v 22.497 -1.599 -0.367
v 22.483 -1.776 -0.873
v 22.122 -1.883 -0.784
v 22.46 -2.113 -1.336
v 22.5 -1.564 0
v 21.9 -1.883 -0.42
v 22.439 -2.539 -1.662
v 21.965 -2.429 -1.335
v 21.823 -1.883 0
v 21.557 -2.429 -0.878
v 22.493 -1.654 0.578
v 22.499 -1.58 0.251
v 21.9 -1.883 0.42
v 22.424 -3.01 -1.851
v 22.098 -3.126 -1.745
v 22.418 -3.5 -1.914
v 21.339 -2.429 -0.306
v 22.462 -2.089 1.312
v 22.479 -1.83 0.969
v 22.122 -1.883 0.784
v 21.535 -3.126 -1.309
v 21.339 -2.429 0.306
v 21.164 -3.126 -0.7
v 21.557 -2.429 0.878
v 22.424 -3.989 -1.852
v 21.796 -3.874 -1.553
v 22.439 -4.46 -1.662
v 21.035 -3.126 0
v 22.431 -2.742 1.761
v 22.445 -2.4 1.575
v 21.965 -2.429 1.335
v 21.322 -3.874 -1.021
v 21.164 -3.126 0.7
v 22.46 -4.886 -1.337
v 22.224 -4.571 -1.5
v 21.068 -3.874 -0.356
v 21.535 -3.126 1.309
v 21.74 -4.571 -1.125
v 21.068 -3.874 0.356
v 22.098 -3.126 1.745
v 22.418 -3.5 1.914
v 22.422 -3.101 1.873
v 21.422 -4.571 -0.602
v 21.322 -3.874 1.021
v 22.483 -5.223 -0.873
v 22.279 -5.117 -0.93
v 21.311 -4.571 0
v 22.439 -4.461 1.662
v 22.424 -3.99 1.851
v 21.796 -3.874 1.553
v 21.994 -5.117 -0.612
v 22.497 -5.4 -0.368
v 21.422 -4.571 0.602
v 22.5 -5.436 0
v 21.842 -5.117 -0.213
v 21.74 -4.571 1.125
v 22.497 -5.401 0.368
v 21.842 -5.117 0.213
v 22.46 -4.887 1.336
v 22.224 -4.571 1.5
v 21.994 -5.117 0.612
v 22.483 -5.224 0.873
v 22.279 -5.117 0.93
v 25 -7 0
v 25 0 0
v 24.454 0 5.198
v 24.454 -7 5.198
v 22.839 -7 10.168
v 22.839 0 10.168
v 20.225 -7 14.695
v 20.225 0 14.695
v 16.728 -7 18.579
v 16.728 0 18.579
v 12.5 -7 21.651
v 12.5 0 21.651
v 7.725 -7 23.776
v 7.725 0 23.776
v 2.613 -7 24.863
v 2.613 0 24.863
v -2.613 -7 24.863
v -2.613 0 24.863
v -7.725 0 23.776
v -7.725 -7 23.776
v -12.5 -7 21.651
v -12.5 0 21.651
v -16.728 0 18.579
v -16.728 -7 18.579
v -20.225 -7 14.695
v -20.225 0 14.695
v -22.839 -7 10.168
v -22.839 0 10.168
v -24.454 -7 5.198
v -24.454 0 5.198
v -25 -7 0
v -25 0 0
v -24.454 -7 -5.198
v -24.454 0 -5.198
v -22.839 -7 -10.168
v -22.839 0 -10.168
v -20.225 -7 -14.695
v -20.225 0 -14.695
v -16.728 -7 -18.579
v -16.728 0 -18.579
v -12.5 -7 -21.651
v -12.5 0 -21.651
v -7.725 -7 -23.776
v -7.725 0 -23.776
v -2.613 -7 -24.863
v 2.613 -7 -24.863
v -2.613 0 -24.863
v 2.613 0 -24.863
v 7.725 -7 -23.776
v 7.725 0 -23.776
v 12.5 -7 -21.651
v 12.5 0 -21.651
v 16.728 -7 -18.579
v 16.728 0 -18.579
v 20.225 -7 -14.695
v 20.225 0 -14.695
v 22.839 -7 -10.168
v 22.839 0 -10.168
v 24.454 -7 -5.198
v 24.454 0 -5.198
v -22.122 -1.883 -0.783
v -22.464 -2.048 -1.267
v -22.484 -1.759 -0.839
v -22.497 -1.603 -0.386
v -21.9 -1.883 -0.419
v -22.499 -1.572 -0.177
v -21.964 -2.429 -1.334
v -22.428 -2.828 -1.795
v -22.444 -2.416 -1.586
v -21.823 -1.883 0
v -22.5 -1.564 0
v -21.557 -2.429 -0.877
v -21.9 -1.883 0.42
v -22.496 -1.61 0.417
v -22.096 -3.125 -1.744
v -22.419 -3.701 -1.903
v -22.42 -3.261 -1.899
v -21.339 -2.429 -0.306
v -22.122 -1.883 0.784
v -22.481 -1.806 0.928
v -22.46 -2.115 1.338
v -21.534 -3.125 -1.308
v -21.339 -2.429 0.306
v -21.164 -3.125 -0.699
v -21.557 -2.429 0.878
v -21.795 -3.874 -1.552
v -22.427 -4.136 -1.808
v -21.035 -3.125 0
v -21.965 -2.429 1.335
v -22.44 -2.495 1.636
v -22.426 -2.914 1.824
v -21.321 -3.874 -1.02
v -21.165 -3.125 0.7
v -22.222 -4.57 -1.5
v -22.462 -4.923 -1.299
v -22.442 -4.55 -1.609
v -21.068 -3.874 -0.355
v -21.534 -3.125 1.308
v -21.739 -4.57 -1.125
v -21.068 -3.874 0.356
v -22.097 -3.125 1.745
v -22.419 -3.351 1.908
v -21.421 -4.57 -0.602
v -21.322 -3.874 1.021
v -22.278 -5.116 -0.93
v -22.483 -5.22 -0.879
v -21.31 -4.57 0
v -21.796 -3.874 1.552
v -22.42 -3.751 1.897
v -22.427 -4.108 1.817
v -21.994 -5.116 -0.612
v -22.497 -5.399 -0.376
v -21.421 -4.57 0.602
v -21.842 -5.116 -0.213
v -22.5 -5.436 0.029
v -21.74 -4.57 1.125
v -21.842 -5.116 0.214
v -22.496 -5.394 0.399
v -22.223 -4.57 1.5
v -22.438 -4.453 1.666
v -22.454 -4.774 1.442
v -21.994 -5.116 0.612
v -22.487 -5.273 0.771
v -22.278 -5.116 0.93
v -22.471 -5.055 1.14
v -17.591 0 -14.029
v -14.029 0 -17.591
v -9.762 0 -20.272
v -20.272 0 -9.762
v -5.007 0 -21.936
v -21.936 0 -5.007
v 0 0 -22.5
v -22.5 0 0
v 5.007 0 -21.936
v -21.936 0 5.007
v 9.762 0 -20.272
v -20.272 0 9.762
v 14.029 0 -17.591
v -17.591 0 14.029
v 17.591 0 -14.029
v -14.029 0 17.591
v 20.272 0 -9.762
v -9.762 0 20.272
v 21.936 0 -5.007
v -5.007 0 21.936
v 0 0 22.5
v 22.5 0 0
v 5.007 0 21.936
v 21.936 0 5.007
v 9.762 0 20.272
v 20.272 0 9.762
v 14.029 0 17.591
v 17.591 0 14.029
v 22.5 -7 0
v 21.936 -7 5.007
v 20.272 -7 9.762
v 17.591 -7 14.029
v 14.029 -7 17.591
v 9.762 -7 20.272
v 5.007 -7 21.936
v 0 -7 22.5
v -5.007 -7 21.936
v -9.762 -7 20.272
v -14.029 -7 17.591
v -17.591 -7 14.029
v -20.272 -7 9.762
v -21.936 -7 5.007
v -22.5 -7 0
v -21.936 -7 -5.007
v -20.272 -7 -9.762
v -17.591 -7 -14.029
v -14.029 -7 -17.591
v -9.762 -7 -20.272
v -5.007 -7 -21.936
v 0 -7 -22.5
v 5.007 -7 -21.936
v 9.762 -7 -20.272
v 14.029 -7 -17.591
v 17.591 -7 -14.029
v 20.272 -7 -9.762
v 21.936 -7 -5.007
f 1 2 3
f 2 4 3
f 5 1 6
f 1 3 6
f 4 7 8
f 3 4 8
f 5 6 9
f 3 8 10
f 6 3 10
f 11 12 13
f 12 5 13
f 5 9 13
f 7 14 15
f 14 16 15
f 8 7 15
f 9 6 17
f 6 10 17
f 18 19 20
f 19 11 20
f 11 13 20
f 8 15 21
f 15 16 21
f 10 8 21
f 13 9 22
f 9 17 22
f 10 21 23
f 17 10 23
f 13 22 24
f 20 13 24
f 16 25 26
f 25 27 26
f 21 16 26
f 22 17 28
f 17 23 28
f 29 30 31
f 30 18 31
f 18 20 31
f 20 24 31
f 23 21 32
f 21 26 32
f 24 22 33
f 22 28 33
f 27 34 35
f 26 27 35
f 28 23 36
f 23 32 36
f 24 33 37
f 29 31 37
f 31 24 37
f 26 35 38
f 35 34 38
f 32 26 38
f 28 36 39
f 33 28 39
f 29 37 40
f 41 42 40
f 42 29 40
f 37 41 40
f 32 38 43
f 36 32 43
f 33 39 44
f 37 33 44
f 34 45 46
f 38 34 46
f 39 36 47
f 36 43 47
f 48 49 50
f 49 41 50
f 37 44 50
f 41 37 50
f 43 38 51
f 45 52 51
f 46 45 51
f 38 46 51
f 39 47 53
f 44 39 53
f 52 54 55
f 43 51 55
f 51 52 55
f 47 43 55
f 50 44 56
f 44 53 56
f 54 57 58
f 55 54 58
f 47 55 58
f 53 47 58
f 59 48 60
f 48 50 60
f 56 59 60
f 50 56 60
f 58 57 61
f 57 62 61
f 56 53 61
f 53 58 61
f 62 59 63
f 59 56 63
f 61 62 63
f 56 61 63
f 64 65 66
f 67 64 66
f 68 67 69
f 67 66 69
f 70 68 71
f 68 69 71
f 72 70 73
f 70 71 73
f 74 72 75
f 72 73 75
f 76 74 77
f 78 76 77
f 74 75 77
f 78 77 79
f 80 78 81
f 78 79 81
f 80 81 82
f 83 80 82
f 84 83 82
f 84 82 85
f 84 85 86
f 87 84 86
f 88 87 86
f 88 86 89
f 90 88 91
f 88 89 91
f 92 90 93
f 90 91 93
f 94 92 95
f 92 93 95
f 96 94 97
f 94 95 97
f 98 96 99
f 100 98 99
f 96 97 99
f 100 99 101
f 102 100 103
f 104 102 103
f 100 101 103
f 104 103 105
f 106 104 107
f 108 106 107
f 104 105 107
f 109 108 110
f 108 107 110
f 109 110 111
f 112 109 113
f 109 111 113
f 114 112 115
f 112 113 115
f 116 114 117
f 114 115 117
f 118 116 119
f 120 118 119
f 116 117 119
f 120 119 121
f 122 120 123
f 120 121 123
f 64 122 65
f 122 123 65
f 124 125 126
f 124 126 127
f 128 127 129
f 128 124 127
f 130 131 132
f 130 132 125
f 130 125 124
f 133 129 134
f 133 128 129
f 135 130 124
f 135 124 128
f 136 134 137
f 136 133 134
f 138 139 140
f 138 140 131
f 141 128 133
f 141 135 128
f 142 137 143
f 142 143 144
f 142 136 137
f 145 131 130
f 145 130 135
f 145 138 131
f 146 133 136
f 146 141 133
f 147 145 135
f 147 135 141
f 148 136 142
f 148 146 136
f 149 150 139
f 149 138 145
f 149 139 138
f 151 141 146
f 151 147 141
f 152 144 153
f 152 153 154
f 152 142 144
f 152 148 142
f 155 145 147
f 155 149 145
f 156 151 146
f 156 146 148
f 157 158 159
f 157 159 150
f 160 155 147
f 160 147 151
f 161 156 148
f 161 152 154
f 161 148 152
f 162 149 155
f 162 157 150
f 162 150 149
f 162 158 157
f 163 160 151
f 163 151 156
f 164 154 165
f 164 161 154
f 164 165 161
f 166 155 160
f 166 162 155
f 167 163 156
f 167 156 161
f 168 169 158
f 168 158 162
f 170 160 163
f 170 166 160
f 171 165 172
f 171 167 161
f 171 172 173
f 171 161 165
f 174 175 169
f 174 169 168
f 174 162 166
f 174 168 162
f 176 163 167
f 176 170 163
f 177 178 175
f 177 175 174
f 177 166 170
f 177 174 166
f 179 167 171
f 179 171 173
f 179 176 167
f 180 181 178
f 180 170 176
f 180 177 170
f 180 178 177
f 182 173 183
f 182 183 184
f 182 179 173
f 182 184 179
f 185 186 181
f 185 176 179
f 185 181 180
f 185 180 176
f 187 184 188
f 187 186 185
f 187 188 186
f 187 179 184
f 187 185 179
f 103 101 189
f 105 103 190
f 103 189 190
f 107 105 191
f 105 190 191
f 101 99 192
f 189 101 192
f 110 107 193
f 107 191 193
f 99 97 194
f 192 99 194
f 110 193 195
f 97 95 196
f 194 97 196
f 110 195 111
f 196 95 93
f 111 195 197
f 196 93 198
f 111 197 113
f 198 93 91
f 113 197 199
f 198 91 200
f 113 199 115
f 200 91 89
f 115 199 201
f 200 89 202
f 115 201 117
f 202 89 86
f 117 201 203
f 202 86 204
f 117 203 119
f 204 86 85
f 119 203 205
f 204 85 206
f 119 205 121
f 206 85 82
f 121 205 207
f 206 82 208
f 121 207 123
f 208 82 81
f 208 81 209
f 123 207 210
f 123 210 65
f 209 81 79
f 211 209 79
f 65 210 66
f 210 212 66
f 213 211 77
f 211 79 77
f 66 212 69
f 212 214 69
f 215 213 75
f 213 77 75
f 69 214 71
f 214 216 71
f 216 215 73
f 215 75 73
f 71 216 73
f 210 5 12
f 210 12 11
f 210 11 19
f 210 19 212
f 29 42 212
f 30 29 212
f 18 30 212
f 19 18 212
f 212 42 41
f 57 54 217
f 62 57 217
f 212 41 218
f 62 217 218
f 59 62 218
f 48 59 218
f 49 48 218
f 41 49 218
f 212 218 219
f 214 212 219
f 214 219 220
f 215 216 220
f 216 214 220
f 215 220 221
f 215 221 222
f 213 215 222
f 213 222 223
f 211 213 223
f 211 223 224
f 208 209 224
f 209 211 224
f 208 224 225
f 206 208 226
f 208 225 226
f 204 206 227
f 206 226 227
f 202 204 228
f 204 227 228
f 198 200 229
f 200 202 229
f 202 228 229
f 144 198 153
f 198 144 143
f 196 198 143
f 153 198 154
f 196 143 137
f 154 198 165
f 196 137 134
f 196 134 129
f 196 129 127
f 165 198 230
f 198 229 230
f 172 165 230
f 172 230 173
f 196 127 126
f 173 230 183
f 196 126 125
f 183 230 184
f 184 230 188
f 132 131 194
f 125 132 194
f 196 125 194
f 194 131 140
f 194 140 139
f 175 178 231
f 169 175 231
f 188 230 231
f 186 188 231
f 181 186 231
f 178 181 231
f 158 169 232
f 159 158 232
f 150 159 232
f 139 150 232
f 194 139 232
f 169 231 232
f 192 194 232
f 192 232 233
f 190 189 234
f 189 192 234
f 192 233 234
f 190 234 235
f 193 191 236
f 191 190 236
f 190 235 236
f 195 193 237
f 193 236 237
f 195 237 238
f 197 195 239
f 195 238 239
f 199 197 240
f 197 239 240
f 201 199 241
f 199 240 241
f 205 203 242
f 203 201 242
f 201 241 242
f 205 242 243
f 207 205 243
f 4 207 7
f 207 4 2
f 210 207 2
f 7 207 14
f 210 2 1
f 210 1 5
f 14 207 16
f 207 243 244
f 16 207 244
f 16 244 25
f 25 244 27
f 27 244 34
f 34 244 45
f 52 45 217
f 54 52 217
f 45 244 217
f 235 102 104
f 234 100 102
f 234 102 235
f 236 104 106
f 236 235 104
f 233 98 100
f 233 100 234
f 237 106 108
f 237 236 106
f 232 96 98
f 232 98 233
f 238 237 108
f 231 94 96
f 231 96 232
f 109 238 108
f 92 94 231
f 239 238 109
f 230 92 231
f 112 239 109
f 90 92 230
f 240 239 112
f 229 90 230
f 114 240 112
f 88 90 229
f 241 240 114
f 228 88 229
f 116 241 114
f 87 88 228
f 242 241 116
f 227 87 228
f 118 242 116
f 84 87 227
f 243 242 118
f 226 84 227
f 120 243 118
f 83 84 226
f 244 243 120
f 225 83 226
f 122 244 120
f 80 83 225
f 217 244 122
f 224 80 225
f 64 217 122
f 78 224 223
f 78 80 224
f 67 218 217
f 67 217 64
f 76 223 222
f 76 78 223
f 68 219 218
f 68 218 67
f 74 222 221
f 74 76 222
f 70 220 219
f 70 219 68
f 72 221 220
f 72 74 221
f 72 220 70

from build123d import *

# Parameters (mm, degrees)
F0_R     = 25
F1_DEPTH = 7
F2_R     = 22.5
F3_DEPTH = 25


with BuildPart() as f1:
    # F0 (on Front) → F1 (new body)
    with BuildSketch(Plane.XZ):
        Circle(F0_R)
    extrude(amount=F1_DEPTH)

    # F2 (on face) → F3 (cut)
    with BuildSketch(Plane.XZ.offset(7)):
        Circle(F2_R)
    extrude(amount=-F3_DEPTH, mode=Mode.SUBTRACT)

    # F5 (on offset) → F6 (revolve)
    with BuildSketch(Plane.YZ.offset(23)):
        with BuildLine():
            Line((-5.5, 0), (-1.5, 0))
            ThreePointArc((-1.5, 0), (-3.5, 2), (-5.5, 0))
        make_face()
    revolve(axis=Axis((23, -3.548927, 0), (0, 1, 0)))

    # F7: F1 across plane


with BuildPart() as f1_1:
    add(f1.part)
    add(f1.part.mirror(Plane.YZ))


solid = f1_1.part
